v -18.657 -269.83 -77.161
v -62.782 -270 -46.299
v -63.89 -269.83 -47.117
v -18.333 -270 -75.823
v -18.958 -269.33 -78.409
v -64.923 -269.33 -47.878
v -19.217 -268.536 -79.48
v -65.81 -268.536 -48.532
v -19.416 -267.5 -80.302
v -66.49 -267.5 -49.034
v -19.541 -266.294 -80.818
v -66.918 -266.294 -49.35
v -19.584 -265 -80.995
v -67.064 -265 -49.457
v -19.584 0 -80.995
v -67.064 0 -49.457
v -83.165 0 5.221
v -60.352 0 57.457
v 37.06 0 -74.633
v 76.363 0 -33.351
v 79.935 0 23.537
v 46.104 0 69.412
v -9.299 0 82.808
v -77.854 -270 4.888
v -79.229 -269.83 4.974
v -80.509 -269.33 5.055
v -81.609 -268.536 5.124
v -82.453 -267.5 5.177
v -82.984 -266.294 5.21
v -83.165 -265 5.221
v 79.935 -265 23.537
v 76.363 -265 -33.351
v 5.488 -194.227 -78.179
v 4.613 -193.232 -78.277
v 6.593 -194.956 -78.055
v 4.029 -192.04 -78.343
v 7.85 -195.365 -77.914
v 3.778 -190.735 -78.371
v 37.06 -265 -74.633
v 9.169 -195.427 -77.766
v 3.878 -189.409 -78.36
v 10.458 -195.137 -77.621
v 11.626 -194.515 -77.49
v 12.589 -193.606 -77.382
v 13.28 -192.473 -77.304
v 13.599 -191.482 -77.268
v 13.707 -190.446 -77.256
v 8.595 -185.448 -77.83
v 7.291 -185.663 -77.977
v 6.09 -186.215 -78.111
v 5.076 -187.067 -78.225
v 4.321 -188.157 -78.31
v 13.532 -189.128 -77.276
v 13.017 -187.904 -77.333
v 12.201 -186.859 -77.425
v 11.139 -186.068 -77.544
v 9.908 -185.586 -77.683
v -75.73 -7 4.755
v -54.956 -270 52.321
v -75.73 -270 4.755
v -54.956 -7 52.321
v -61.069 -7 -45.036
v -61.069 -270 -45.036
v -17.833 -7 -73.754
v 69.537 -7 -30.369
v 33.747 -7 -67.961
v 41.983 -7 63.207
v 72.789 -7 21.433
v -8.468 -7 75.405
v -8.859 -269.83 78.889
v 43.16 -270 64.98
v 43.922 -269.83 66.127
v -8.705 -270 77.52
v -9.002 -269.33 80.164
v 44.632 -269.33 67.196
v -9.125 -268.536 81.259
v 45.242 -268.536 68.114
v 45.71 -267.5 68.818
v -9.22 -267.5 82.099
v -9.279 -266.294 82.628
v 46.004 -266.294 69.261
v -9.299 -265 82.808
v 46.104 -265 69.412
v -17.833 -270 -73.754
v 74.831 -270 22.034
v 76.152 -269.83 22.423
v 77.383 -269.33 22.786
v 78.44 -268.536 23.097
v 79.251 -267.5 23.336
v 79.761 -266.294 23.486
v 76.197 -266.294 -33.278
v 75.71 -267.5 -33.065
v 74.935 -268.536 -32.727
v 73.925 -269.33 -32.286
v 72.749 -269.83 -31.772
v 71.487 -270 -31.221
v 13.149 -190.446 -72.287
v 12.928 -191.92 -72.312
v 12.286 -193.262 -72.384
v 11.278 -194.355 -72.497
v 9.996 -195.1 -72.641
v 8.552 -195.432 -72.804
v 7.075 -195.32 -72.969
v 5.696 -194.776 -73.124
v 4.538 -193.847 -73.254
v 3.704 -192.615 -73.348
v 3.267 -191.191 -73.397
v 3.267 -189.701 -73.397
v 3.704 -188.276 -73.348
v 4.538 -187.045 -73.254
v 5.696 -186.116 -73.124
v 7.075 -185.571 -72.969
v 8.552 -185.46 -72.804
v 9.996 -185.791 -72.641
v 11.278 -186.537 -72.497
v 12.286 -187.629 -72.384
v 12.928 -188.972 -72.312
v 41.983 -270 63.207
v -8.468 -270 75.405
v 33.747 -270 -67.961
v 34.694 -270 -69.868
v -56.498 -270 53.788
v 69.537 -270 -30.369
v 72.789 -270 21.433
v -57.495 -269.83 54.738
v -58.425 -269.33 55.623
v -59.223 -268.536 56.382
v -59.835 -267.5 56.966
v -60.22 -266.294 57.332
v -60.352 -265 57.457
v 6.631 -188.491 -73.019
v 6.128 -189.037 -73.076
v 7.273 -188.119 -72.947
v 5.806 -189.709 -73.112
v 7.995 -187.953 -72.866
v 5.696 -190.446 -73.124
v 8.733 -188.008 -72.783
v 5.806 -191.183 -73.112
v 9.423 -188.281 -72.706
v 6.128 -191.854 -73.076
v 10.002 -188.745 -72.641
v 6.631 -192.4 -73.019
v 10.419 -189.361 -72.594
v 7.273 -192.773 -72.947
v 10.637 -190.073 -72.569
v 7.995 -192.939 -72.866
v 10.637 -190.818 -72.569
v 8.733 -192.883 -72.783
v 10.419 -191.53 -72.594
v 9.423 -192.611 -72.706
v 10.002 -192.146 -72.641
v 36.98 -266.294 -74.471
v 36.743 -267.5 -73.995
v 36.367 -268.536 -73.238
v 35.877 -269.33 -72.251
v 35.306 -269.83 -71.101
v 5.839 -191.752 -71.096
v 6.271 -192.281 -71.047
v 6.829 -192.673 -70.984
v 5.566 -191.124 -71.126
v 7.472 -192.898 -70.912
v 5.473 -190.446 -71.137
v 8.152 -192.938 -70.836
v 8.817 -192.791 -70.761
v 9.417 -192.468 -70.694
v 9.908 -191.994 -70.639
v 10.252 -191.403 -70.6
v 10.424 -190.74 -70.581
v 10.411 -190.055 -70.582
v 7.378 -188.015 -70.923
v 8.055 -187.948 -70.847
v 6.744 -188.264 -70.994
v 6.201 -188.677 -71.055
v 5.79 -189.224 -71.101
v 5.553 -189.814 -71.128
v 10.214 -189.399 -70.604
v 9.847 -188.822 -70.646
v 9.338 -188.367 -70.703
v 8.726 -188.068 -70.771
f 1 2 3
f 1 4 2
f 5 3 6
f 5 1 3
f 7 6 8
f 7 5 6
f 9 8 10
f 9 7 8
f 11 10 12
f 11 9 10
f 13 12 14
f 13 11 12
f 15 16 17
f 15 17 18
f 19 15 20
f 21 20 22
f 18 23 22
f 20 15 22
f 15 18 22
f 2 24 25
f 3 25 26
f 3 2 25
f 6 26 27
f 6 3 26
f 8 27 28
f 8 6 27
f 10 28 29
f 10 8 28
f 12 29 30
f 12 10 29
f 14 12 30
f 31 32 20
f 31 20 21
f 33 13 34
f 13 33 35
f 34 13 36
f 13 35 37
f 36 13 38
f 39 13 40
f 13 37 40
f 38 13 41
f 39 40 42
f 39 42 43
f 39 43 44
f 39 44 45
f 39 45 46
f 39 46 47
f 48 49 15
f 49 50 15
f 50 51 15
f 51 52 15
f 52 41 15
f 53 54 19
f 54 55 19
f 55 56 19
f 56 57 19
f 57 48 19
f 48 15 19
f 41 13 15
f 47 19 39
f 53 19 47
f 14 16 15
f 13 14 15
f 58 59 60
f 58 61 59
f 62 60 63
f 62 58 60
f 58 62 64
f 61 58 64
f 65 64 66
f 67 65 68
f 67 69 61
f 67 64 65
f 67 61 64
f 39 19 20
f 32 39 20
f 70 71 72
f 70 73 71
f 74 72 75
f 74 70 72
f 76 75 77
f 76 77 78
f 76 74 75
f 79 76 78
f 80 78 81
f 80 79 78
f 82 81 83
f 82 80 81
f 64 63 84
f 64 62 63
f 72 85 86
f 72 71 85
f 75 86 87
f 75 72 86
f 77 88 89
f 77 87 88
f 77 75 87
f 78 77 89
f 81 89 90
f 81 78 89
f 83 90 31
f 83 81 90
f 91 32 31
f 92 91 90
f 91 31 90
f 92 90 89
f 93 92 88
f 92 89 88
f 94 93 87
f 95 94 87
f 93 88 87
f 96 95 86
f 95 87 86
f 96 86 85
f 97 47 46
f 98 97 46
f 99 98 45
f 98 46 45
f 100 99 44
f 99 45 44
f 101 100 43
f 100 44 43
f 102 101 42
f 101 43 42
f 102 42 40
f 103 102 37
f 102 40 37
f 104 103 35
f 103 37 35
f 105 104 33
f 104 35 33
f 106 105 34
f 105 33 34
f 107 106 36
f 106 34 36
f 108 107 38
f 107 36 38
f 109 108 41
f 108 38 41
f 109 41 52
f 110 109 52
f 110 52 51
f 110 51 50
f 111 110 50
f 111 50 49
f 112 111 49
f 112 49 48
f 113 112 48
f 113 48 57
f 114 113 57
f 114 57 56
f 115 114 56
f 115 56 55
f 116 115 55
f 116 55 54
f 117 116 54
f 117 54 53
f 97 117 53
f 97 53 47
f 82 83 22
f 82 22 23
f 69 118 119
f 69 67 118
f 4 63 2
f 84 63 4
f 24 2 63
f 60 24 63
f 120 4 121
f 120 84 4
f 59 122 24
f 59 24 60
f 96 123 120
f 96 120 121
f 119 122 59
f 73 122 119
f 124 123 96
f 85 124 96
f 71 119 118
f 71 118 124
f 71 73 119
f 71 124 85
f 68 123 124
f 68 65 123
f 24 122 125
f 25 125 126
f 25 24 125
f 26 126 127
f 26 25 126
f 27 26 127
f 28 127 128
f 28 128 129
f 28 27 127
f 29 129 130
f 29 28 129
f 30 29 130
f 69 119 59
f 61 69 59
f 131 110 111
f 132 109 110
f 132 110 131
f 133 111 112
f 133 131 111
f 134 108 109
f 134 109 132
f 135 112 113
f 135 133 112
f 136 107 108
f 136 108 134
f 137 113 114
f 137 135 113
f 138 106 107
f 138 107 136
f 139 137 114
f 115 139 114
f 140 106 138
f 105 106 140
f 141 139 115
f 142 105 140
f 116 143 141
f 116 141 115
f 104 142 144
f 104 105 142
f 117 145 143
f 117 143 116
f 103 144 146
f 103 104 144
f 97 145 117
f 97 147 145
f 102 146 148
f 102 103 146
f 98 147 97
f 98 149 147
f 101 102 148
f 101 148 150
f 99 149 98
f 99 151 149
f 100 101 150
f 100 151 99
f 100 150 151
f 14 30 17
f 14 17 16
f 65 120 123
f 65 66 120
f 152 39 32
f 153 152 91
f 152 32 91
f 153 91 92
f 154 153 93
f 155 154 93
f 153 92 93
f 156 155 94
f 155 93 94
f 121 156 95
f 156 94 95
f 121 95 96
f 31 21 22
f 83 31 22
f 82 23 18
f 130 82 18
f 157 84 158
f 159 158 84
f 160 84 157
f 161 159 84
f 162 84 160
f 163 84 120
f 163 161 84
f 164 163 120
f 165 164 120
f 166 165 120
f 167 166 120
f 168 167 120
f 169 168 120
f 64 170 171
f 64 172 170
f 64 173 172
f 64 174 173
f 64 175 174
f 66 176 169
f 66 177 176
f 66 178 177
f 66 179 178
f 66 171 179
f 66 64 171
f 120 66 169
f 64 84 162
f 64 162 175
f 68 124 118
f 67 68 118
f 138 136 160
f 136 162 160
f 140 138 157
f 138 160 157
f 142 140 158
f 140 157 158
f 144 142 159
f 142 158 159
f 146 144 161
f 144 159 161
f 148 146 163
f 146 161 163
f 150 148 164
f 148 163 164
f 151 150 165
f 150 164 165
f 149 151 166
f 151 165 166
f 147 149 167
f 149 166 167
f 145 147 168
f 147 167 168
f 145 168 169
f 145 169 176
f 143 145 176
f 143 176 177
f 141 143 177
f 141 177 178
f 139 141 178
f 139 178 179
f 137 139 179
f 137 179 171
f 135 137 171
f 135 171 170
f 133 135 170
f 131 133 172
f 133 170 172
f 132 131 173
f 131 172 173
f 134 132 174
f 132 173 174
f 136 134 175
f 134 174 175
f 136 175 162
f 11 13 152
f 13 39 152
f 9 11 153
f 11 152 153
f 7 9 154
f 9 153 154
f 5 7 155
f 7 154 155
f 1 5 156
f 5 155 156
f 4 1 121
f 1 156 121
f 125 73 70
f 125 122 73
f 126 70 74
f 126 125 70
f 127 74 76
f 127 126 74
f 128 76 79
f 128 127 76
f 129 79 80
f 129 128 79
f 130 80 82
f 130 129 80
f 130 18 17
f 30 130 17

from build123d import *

# Parameters (mm, degrees)
F1_DEPTH       = 270
F2_T           = -7
F5_D           = 5
F5_DEPTH       = 20
F5_CBORE_D     = 10
F5_CBORE_DEPTH = 5
F6_R           = 5


with BuildPart() as f1:
    # F0 (on Front) → F1 (new body)
    with BuildSketch(Plane.XZ):
        Polygon((37.060434, -74.633442), (76.363391, -33.350546), (79.93507, 23.537441), (46.10424, 69.411998), (-9.299275, 82.80791), (-60.351557, 57.45708), (-83.164674, 5.221444), (-67.064116, -49.457364), (-19.583513, -80.994521), align=None)
    extrude(amount=F1_DEPTH)

    # F2
    f2_openings = [f1.faces().sort_by_distance(p)[0] for p in [
        (0, -270, 0),
    ]]
    offset(amount=F2_T, openings=f2_openings)

    # F5
    with Locations(Plane(origin=(8.73846, 0, -77.813982), x_dir=(0.993753, 0, 0.111598), z_dir=(0.111598, 0, -0.993753))):
        with Locations((0, 190.445736)):
            CounterBoreHole(F5_D / 2, F5_CBORE_D / 2, F5_CBORE_DEPTH, depth=F5_DEPTH)

    # F6
    f6_edges = [f1.edges().sort_by_distance(p)[0] for p in [
        (-75.114395, -270, -22.11796),
        (8.73846, -270, -77.813982),
        (56.711913, -270, -53.991994),
        (-43.323814, -270, -65.225943),
        (78.14923, -270, -4.906553),
        (63.019655, -270, 46.47472),
        (18.402482, -270, 76.109954),
        (-34.825416, -270, 70.132495),
        (-71.758115, -270, 31.339262),
    ]]
    fillet(f6_edges, radius=F6_R)


solid = f1.part
